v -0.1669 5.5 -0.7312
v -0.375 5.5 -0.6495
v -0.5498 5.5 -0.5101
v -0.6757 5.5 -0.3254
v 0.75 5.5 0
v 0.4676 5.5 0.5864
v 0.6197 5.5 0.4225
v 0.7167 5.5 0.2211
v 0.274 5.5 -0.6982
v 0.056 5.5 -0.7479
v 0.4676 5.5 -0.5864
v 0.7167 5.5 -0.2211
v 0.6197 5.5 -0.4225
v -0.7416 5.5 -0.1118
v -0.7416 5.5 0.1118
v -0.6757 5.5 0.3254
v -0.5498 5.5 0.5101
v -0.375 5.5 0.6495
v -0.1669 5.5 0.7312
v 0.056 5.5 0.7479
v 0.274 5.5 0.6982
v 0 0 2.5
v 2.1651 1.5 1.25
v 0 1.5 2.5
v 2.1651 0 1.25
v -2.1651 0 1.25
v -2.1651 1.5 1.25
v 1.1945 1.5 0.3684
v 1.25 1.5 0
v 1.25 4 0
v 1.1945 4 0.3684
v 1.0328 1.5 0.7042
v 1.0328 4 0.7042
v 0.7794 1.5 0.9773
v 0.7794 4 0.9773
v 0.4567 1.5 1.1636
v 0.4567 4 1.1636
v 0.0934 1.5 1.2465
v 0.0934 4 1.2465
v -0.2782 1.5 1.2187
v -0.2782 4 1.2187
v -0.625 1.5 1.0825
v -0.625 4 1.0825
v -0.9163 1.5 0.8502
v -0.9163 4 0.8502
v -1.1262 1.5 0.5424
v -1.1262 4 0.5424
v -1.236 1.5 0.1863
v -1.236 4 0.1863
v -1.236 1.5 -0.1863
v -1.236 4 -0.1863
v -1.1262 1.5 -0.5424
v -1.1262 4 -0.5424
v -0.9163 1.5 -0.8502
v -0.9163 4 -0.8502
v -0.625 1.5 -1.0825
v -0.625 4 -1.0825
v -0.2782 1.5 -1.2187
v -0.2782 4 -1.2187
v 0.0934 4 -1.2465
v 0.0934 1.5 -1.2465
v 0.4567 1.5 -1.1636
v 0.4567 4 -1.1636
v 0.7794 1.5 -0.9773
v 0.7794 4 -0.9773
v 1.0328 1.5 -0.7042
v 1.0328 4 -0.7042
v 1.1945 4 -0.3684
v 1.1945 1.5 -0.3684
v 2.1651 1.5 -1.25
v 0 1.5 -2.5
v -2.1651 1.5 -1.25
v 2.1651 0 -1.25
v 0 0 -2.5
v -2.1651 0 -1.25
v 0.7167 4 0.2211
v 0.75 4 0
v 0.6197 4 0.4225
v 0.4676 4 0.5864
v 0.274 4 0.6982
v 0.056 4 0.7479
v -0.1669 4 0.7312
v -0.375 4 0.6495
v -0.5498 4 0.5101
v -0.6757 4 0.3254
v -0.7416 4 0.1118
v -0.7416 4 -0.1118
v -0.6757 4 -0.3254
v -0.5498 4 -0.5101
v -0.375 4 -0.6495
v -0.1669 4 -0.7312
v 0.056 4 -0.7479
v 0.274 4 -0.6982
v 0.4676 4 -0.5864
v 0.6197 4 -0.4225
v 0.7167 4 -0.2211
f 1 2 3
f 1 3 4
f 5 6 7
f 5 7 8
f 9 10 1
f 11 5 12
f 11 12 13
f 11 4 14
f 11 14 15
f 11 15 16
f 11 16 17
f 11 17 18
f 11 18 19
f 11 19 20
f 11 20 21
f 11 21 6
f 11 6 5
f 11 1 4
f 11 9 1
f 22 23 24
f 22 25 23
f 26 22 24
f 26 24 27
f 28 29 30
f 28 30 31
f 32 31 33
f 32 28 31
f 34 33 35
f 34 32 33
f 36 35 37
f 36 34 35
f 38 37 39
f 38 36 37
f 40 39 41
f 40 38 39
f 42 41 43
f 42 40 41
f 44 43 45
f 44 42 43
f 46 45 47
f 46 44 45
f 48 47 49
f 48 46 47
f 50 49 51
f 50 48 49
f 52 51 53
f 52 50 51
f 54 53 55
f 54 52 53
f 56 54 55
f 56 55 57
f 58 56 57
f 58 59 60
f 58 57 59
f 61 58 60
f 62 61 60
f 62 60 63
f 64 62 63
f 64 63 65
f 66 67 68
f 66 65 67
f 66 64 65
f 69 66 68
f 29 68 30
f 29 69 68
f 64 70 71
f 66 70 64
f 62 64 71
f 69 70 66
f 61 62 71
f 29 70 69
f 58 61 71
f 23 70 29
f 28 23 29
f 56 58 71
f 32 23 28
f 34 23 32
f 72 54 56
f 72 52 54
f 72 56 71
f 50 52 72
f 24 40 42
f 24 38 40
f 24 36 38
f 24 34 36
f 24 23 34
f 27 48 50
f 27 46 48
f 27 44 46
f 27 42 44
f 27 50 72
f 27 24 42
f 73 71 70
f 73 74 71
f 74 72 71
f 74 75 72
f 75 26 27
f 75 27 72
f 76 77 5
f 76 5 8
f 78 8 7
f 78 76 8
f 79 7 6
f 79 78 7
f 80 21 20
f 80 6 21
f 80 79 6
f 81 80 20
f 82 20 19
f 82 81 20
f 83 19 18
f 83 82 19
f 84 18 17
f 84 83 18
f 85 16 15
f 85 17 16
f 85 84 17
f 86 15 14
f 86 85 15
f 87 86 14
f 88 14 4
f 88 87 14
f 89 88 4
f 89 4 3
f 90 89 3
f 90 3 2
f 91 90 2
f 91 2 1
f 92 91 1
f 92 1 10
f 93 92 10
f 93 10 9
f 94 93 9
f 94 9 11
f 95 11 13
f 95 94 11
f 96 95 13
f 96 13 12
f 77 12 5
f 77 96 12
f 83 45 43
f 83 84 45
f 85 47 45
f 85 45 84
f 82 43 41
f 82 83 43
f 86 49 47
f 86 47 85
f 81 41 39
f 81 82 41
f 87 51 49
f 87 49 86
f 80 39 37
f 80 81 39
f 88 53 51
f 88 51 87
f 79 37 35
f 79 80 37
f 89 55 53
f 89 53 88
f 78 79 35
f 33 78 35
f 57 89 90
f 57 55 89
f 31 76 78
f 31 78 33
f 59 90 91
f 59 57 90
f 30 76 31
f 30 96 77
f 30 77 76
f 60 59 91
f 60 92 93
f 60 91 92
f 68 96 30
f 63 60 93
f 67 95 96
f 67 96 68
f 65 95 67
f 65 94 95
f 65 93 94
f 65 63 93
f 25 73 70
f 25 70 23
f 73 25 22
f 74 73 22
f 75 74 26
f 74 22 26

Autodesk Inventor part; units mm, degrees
ref_plane "YZ Plane" through (0, 0, 0) normal (1, 0, 0) x (0, 1, 0)
ref_plane "XZ Plane" through (0, 0, 0) normal (0, 1, 0) x (-1, 0, 0)
ref_plane "XY Plane" through (0, 0, 0) normal (0, 0, 1) x (1, 0, 0)
sketch "Sketch1" plane through (0, 0, 0) normal (0, 1, 0) x (-1, 0, 0)
  line L0 (0, -2.5) -> (-2.1651, -1.25)
  line L1 (-2.1651, -1.25) -> (-2.1651, 1.25)
  line L2 (-2.1651, 1.25) -> (0, 2.5)
  line L3 (0, 2.5) -> (2.1651, 1.25)
  line L4 (2.1651, 1.25) -> (2.1651, -1.25)
  line L5 (2.1651, -1.25) -> (0, -2.5)
  point P0 (0, 0)
  point P1 (0, 0)
  dimension "d0" = 5
extrude "Extrusion1" add sketch "Sketch1" along normal blind 1.5
sketch "Sketch2" plane through (0, 1.5, 0) normal (0, 1, 0) x (1, 0, 0)
  circle A0 centre (0, 0) radius 1.25
  dimension "d3" = 2.5
extrude "Extrusion2" add sketch "Sketch2" along normal blind 2.5
thread "Thread1" size "M2.5x0.45" class "6g" standard "ANSI Metric M Profile" length 2.5
sketch "Sketch3" plane through (0, 4, 0) normal (0, 1, 0) x (1, 0, 0)
  circle A0 centre (0, 0) radius 0.75
  dimension "d10" = 1.5
extrude "Extrusion3" add sketch "Sketch3" along normal blind 1.5
properties material "Steel, Mild"
